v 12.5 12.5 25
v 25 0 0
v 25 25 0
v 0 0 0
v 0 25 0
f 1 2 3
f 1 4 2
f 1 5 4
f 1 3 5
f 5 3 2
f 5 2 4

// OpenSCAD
pyr_points = [[25,25,0], [25,0,0], [0,0,0], [0,25,0], 
[12.5,12.5,25]];
pyr_triangles = [[0,1,4],[1,2,4],[2,3,4],[3,0,4],[1,0,3],[2,1,3]];
polyhedron(pyr_points, pyr_triangles);
